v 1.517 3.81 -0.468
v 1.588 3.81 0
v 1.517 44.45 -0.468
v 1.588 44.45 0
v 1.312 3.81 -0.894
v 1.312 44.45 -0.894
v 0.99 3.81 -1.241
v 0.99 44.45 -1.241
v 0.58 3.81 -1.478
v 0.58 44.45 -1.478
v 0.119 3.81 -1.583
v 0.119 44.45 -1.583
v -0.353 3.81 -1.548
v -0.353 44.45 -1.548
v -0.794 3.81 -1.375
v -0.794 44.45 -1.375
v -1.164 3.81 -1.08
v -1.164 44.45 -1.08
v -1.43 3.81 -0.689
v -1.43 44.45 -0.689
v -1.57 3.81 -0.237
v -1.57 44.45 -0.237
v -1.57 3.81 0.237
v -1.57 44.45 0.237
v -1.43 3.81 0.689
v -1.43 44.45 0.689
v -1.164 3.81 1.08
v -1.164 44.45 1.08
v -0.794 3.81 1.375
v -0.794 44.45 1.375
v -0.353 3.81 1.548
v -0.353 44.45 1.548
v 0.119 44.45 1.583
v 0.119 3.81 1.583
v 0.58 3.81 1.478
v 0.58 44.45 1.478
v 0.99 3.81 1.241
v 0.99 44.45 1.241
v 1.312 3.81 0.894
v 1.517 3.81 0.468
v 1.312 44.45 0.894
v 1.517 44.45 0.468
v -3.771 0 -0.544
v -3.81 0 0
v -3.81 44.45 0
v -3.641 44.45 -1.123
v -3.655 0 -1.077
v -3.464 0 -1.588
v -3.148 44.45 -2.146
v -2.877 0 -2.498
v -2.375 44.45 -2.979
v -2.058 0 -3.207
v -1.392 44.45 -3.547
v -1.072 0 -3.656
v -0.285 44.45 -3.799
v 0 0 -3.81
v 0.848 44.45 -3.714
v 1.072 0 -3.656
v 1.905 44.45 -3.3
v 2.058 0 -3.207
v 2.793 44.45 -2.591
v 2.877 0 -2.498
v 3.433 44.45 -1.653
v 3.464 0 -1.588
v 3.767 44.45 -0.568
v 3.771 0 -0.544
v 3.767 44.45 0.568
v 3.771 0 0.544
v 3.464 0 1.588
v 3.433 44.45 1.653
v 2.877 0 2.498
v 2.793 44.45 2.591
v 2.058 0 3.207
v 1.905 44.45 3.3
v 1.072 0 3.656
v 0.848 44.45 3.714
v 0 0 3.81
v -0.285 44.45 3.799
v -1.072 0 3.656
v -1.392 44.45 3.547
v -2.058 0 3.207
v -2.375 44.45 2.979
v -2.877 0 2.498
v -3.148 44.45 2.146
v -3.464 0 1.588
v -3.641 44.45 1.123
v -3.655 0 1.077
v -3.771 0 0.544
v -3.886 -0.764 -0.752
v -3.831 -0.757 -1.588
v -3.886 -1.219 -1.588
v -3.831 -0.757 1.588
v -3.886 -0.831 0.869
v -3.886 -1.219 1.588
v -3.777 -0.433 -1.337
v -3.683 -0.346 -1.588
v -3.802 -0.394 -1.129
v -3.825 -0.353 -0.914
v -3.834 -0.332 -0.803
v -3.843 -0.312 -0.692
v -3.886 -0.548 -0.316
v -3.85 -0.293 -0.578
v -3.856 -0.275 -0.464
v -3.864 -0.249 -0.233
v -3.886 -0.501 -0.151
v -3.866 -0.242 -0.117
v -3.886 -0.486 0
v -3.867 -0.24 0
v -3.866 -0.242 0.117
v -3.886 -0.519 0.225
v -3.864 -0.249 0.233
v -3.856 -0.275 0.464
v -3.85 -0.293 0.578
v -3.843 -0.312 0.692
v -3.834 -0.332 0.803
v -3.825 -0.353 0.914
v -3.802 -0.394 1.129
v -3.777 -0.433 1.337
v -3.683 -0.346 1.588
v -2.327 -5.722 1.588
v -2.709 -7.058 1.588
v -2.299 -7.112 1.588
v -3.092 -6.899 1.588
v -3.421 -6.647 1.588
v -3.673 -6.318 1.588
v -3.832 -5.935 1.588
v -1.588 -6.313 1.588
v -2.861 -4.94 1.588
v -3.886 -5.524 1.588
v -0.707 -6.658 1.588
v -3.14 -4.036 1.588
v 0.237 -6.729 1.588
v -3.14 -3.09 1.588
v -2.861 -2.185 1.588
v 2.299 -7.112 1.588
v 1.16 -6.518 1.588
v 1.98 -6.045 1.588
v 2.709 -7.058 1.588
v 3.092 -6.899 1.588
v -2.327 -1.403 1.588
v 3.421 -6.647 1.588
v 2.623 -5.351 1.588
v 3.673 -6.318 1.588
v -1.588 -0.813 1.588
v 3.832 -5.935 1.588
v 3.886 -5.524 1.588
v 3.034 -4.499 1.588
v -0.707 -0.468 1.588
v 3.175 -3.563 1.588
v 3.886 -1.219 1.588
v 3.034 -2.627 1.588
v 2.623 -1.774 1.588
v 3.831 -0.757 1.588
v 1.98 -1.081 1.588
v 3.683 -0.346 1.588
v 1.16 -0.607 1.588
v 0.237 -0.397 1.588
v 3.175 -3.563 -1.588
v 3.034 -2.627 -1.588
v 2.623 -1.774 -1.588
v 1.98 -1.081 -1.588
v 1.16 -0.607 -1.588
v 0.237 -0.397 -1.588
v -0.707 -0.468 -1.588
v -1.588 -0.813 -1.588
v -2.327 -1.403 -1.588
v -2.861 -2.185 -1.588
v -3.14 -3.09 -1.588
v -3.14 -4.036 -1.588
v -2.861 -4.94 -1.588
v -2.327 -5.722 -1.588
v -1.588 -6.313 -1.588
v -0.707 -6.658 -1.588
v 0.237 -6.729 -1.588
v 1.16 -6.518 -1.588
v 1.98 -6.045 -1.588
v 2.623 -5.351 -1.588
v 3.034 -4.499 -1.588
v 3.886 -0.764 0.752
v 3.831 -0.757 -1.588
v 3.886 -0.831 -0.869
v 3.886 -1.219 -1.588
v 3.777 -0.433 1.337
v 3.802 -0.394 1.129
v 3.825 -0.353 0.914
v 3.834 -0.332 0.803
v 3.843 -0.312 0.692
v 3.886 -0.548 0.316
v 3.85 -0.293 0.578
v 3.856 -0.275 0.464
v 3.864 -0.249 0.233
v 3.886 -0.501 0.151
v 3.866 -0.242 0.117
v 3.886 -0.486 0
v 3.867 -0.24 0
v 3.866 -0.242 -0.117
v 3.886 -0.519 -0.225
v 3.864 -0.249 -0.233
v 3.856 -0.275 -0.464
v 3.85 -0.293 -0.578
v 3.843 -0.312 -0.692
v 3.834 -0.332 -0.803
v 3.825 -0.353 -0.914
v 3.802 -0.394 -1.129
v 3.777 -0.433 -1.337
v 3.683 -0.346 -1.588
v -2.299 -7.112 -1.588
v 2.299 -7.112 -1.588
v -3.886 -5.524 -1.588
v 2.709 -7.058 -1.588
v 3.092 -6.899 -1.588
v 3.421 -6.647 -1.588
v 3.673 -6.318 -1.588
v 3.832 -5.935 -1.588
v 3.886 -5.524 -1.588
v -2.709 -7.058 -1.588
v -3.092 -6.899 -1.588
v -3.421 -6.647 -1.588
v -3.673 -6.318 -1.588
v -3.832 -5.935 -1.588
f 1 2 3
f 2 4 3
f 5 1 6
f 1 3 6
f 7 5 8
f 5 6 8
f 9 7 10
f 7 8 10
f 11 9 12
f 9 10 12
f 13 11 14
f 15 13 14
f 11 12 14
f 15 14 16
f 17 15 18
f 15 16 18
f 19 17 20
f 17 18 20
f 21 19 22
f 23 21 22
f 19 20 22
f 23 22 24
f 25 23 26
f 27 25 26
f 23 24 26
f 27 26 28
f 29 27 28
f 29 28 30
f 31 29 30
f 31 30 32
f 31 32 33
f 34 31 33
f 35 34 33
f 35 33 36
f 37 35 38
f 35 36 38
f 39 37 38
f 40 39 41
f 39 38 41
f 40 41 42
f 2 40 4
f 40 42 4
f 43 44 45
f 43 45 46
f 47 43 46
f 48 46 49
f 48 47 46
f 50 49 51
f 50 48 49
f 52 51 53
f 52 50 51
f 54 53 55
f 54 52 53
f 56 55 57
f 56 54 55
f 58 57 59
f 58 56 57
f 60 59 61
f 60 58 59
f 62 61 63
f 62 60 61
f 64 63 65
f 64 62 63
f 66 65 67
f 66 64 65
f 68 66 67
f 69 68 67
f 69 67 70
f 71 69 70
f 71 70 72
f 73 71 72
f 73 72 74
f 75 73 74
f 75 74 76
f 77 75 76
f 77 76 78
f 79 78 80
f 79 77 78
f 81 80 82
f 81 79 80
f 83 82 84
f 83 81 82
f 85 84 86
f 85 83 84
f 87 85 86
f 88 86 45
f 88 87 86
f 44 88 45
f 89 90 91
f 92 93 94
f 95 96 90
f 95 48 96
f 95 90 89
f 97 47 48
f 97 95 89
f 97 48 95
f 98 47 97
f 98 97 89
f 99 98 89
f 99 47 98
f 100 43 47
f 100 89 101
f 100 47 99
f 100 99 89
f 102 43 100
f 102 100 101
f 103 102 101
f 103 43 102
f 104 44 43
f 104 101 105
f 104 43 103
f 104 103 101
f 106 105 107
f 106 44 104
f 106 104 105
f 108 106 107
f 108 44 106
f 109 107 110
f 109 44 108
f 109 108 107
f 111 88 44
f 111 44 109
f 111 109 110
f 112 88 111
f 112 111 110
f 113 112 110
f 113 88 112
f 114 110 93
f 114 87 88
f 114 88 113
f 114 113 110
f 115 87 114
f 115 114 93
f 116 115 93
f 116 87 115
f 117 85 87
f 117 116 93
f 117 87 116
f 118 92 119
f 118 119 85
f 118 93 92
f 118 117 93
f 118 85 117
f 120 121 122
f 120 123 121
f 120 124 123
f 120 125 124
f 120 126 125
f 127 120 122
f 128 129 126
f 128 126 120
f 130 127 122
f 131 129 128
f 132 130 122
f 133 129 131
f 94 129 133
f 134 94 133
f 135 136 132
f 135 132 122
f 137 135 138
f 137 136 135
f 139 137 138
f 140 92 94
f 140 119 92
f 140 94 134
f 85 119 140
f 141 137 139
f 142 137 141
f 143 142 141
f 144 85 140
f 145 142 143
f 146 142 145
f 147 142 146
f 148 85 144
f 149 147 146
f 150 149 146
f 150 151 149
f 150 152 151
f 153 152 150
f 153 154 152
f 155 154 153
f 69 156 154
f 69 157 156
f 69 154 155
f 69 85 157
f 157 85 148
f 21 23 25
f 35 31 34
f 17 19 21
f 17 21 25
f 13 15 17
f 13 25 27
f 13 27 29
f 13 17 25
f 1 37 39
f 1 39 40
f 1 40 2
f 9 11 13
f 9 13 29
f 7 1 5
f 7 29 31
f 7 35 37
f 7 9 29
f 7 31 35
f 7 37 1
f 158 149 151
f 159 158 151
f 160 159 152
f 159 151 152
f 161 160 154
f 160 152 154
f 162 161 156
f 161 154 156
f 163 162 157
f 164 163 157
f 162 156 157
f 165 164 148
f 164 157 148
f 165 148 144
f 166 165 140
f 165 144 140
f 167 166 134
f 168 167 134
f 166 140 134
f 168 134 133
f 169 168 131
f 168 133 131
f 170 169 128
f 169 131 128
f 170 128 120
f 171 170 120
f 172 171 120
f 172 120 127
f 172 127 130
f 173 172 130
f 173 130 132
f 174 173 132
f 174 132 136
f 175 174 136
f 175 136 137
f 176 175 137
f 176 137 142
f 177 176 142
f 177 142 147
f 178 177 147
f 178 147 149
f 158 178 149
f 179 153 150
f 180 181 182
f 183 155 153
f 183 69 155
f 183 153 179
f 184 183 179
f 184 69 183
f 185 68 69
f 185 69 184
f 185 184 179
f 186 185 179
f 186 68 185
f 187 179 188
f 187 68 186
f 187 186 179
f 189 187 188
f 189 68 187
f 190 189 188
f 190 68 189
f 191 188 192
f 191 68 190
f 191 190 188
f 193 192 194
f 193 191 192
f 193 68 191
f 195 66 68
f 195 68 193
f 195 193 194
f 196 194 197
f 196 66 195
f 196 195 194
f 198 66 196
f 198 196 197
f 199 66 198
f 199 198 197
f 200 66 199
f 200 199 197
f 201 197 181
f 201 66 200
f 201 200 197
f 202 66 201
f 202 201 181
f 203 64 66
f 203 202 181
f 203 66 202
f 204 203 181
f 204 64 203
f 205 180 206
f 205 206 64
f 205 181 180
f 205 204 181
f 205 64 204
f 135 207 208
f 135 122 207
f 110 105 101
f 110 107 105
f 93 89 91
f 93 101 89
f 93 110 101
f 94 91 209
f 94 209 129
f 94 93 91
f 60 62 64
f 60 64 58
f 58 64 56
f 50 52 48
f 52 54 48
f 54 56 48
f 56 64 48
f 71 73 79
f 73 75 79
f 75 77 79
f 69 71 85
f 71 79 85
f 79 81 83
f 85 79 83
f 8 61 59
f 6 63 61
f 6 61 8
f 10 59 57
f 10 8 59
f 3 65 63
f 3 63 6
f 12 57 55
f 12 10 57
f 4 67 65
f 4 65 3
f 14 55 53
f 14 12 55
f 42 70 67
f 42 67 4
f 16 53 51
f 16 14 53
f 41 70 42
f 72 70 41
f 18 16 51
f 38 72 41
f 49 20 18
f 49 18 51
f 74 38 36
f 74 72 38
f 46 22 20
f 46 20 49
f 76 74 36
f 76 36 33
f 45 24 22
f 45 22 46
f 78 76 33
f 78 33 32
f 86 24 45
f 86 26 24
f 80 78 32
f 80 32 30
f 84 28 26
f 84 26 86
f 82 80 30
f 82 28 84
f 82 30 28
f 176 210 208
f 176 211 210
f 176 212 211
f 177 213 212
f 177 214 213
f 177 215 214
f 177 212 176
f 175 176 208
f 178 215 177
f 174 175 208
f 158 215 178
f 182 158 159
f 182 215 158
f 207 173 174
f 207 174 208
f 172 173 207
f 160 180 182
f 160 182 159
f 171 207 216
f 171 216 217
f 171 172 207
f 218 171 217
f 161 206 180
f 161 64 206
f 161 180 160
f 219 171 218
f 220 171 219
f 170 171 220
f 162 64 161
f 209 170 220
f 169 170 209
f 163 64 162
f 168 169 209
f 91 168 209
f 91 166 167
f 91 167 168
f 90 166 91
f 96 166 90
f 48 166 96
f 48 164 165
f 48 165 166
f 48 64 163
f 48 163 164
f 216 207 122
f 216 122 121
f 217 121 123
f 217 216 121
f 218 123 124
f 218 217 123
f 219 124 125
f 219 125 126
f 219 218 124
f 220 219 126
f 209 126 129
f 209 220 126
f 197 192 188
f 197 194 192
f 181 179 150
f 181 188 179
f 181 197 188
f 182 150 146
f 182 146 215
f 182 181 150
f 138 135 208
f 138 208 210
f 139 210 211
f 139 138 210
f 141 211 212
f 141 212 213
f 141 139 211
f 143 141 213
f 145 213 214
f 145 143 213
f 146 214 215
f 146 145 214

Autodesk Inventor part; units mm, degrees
ref_plane "YZ Plane" through (0, 0, 0) normal (1, 0, 0) x (0, 1, 0)
ref_plane "XZ Plane" through (0, 0, 0) normal (0, 1, 0) x (-1, 0, 0)
ref_plane "XY Plane" through (0, 0, 0) normal (0, 0, 1) x (1, 0, 0)
sketch "Sketch1" plane through (0, 0, 0) normal (0, 1, 0) x (-1, 0, 0)
  circle A0 centre (0, 0) radius 3.81
  dimension "d0" = 7.62
extrude "Extrusion1" add sketch "Sketch1" along normal blind 44.45
sketch "Sketch2" plane through (0, 44.45, 0) normal (0, 1, 0) x (1, 0, 0)
  circle A0 centre (0, 0) radius 1.5875
  dimension "d3" = 3.175
extrude "Extrusion2" cut sketch "Sketch2" against normal blind 40.64
sketch "Sketch3" plane through (0, 0, 0) normal (0, -1, 0) x (1, 0, 0)
  line L0 (3.8861, -1.5875) -> (-3.8861, -1.5875)
  line L1 (-3.8861, -1.5875) -> (-3.8861, 1.5875)
  line L2 (-3.8861, 1.5875) -> (3.8861, 1.5875)
  line L3 (3.8861, 1.5875) -> (3.8861, -1.5875)
  line L4 (3.8861, -1.5875) -> (-3.8861, 1.5875) construction
  line L5 (-3.8861, -1.5875) -> (3.8861, 1.5875) construction
  point P0 (0, 0)
extrude "Extrusion3" add sketch "Sketch3" along normal blind 7.112
sketch "Sketch5" plane through (-3.8861, 0, 1.5875) normal (0, 0, 1) x (1, 0, 0)
  circle A0 centre (3.8861, -3.5629) radius 3.175
  point P0 (3.8861, 0)
  dimension "d16" = 6.35
extrude "Extrusion4" cut sketch "Sketch5" against normal blind 6.35
fillet "Fillet2" radius 1.5875 4 edges at (3.8861, 0, 0) (3.8861, -7.112, 0) (-3.8861, 0, 0) (-3.8861, -7.112, 0)
properties part number "cylendar2"
